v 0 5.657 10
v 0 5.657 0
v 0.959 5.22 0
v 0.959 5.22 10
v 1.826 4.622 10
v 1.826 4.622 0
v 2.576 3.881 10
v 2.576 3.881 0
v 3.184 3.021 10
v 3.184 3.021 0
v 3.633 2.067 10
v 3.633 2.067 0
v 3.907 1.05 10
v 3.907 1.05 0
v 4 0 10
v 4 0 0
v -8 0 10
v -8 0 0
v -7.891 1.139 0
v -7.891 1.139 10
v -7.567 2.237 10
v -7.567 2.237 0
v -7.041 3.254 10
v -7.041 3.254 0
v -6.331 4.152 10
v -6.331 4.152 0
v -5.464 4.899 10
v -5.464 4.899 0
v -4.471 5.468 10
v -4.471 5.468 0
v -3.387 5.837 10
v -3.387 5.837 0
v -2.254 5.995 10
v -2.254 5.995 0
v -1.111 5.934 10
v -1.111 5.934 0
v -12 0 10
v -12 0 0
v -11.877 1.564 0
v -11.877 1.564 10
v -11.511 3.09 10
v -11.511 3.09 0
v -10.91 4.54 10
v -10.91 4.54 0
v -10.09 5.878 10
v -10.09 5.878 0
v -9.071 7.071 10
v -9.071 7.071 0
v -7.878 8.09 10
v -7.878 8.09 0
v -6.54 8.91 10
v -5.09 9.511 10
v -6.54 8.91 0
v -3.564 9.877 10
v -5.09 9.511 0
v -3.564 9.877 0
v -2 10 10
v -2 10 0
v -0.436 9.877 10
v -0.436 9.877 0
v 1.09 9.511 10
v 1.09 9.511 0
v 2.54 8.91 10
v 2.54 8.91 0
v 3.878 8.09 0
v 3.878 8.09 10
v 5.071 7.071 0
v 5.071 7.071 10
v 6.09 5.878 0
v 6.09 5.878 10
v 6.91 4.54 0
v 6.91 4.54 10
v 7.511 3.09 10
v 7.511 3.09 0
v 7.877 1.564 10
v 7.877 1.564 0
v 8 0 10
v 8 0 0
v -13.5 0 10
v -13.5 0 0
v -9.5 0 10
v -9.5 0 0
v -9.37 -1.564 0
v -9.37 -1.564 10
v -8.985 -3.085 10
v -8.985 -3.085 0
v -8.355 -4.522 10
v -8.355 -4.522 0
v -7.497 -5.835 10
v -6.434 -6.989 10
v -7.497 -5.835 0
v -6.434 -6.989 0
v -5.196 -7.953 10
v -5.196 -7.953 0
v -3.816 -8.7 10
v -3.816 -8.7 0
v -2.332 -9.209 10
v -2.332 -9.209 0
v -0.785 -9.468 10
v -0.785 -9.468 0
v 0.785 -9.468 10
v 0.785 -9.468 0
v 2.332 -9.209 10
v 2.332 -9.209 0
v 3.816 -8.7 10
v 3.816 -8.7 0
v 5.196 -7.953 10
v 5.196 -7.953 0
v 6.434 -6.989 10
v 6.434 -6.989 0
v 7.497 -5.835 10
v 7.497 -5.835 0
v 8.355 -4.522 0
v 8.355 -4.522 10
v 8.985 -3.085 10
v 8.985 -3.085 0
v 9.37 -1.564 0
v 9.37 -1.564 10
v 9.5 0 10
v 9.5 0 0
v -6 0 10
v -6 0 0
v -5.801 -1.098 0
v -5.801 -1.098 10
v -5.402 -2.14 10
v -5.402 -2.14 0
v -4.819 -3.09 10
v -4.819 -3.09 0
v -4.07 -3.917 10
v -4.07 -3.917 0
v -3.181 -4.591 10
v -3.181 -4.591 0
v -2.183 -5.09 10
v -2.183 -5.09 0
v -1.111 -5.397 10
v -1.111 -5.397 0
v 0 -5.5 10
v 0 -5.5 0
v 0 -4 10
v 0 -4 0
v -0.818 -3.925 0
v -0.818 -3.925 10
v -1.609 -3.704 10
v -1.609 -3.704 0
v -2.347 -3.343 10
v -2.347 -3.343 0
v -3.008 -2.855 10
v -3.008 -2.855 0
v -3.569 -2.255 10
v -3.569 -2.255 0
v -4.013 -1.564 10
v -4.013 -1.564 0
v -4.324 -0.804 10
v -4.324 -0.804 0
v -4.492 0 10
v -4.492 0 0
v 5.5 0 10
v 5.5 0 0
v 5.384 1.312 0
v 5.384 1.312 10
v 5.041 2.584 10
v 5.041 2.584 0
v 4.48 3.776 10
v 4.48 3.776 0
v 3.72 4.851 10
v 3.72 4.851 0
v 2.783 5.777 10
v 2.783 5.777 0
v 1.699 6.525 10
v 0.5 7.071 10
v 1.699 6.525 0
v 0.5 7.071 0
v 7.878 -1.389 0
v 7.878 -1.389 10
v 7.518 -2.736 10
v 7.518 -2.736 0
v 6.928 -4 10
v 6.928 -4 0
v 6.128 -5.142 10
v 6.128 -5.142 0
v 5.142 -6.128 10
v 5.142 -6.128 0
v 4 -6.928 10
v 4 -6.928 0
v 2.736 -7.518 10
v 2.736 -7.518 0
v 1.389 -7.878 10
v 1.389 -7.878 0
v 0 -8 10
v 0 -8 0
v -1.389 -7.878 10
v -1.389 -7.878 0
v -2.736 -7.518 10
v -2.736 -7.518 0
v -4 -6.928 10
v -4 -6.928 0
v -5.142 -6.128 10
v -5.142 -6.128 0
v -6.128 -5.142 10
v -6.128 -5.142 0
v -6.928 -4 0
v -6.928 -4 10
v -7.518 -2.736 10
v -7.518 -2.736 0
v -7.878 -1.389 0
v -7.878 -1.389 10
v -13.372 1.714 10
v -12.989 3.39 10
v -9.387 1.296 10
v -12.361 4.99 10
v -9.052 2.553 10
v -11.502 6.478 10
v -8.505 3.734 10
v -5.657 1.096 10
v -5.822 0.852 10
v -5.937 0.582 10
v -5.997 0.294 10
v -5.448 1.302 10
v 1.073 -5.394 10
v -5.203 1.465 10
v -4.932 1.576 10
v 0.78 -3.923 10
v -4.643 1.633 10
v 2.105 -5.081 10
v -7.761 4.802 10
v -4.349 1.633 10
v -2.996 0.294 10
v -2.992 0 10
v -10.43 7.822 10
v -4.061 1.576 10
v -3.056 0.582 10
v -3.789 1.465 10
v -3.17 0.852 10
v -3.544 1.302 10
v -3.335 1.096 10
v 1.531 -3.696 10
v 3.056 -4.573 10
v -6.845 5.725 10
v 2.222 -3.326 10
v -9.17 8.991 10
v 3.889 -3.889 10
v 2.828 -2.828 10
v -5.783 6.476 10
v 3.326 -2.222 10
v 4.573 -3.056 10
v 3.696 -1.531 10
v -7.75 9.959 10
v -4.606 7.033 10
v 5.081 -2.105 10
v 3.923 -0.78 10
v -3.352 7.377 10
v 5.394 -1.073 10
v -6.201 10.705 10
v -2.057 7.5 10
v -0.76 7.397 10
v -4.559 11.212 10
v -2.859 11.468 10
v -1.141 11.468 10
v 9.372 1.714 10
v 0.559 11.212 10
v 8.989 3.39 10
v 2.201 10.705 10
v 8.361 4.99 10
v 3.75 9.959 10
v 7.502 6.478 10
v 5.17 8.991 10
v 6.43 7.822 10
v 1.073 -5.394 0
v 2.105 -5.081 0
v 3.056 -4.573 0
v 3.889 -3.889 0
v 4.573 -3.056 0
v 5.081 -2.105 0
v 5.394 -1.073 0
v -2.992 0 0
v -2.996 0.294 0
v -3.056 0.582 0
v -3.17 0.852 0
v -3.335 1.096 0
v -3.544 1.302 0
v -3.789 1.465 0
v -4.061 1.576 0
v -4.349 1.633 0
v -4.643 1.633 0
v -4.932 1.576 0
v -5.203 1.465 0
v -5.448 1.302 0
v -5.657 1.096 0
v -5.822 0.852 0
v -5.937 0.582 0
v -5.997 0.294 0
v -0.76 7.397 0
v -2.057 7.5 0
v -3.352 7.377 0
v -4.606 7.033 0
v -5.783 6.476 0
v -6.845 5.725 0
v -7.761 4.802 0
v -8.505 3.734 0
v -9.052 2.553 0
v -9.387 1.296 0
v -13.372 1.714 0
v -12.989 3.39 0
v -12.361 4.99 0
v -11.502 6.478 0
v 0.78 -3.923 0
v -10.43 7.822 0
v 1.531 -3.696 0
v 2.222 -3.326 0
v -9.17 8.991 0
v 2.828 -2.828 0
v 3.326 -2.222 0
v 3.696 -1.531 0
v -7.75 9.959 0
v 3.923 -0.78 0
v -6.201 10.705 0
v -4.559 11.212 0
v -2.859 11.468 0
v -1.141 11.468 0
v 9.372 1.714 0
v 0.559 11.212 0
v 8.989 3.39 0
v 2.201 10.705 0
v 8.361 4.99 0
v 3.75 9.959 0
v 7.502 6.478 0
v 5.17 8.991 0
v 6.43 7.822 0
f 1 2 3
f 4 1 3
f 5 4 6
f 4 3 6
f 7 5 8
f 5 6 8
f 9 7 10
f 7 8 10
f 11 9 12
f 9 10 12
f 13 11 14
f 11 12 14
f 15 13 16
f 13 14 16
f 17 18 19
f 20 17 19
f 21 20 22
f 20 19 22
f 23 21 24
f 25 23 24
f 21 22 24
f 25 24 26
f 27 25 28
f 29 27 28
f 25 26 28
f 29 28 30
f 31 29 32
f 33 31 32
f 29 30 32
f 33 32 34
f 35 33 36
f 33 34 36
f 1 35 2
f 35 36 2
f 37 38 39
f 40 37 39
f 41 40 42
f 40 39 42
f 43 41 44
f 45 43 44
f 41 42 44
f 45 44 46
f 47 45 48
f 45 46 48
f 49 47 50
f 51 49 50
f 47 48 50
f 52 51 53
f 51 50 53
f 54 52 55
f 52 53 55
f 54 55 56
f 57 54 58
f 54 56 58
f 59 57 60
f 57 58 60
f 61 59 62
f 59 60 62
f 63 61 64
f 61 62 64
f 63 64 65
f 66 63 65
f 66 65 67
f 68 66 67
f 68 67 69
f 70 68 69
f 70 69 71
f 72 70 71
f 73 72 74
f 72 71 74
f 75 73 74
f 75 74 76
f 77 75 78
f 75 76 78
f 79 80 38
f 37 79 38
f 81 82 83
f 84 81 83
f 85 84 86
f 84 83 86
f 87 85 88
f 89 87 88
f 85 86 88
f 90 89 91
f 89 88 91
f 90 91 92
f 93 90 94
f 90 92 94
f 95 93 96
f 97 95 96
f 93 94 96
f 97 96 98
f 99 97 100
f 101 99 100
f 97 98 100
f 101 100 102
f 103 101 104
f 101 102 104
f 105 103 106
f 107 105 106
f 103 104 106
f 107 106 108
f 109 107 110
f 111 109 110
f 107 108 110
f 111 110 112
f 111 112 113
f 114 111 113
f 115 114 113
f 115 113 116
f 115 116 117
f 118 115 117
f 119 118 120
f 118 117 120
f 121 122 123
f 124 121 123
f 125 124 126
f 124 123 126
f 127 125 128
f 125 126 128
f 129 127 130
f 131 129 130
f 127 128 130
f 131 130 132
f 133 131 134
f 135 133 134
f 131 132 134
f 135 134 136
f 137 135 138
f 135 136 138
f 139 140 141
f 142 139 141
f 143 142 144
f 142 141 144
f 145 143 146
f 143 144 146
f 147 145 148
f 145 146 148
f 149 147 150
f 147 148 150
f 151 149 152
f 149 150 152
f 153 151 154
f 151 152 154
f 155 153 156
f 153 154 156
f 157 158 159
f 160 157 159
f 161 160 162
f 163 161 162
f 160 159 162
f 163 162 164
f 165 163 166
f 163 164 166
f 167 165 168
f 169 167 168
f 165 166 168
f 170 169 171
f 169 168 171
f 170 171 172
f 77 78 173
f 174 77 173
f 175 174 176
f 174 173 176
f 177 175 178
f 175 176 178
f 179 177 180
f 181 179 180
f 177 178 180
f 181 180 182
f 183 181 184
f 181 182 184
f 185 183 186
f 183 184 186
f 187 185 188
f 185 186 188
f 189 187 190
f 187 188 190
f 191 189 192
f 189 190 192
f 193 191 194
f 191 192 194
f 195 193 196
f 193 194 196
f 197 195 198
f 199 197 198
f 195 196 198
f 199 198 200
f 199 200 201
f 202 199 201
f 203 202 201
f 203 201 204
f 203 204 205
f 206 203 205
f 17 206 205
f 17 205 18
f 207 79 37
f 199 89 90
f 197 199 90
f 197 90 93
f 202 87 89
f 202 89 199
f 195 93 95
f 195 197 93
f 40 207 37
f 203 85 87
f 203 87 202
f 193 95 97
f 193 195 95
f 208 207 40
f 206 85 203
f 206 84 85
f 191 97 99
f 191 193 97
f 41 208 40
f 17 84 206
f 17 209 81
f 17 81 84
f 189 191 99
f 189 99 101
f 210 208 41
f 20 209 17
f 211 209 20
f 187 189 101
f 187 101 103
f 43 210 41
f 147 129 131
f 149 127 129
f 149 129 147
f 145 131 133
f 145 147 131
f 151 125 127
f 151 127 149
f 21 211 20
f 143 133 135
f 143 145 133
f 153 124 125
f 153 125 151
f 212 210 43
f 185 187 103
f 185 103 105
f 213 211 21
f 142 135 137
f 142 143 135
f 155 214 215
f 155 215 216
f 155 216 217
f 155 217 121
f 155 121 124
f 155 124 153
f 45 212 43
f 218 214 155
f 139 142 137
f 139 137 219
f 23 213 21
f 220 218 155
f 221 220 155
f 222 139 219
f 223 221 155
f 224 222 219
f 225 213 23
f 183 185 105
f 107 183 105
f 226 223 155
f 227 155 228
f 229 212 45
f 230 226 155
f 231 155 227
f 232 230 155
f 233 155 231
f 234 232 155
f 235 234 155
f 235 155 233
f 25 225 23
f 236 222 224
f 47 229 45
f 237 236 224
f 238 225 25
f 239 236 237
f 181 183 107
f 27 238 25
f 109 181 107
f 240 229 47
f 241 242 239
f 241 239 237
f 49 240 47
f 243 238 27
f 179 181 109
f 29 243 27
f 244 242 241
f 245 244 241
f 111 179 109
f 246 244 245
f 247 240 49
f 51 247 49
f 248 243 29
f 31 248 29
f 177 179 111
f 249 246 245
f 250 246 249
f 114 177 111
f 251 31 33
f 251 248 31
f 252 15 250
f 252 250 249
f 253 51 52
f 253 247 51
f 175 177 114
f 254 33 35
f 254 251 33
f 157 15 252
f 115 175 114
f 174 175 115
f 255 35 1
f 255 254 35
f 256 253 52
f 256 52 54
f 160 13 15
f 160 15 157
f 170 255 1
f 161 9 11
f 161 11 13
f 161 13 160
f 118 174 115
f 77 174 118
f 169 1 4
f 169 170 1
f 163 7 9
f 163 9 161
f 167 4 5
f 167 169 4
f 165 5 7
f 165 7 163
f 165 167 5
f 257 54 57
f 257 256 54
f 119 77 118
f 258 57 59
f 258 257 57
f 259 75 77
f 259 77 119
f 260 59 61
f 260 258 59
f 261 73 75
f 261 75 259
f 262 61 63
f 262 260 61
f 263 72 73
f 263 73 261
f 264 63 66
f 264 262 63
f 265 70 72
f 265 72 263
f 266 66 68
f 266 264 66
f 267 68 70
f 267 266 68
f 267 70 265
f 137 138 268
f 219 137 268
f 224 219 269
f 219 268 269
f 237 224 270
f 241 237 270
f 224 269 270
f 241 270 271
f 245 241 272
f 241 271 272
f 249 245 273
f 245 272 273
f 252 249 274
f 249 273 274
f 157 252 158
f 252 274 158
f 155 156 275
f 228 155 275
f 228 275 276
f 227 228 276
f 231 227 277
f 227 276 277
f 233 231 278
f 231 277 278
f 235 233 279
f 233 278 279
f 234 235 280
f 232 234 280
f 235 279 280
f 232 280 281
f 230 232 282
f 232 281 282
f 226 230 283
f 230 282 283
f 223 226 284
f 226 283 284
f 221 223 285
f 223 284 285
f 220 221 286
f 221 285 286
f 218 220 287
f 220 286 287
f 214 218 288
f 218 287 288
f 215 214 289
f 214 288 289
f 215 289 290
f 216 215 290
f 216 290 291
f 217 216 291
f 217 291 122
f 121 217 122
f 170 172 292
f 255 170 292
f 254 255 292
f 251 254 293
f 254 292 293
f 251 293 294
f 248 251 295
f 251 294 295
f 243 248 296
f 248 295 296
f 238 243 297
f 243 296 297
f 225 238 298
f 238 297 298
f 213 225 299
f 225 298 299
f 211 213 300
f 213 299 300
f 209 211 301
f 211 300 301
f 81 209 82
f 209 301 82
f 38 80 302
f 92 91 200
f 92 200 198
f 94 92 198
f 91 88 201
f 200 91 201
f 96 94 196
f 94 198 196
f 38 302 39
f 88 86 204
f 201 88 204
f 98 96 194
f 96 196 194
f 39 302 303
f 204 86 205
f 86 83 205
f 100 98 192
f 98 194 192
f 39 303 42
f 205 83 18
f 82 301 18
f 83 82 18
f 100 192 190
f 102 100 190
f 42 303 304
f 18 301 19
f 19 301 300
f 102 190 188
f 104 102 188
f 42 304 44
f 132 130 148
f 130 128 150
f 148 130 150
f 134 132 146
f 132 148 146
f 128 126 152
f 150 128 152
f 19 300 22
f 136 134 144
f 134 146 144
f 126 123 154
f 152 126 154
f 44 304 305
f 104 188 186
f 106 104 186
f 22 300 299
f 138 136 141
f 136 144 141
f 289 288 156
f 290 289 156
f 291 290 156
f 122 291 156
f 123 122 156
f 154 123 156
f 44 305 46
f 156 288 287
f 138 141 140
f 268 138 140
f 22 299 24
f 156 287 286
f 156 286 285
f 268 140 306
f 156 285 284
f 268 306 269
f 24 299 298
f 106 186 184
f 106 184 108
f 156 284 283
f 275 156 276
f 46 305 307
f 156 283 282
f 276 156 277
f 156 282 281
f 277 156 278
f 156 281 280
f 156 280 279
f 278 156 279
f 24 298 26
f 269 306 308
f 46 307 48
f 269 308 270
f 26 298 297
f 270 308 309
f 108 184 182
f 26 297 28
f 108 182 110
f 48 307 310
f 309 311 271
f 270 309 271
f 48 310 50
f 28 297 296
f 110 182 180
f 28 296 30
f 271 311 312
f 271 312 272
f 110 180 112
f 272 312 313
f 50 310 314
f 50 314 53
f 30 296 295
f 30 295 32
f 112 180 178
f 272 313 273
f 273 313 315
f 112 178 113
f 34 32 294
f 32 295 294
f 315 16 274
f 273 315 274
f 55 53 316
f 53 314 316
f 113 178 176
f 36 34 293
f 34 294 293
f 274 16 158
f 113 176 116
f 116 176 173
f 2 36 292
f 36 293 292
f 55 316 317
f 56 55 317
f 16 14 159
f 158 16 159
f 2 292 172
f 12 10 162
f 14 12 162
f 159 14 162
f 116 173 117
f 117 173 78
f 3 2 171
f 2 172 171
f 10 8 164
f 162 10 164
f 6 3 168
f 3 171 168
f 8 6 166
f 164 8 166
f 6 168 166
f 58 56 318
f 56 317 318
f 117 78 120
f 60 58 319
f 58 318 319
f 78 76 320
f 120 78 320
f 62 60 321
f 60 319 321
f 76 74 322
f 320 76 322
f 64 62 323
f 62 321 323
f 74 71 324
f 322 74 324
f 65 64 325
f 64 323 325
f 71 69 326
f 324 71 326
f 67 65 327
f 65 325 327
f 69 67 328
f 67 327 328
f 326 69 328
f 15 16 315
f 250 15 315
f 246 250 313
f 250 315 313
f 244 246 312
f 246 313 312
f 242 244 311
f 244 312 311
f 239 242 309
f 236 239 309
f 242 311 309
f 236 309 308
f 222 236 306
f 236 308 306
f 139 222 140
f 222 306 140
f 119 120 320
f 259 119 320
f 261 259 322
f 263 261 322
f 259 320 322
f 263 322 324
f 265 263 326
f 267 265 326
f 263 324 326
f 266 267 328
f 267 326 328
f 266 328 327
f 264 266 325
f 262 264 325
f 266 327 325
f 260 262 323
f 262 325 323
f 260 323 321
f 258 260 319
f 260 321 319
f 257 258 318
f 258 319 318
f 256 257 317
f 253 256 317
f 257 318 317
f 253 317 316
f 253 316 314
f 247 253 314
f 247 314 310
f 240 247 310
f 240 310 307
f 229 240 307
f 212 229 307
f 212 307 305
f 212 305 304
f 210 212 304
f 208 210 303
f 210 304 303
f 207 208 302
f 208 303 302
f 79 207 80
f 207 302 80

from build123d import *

# Parameters (mm, degrees)
F1_DEPTH = 10


with BuildPart() as f1:
    # F0 (on Top) → F1 (new body)
    with BuildSketch(Plane.XY):
        with BuildLine():
            ThreePointArc((0, 5.656854), (2.898979, 3.464102), (4, 0))
            ThreePointArc((4, 0), (2.828427, -2.828427), (0, -4))
            ThreePointArc((0, -4), (-3.007566, -2.855084), (-4.492418, 0))
            Line((-4.492418, 0), (-2.992418, 0))
            ThreePointArc((-2.992418, 0), (-4.496209, 1.640499), (-6, 0))
            ThreePointArc((-6, 0), (-4.069705, -3.916951), (0, -5.5))
            ThreePointArc((0, -5.5), (3.889087, -3.889087), (5.5, 0))
            ThreePointArc((5.5, 0), (4.123724, 4.330127), (0.5, 7.071068))
            ThreePointArc((0.5, 7.071068), (-6.330127, 6.123724), (-9.5, 0))
            ThreePointArc((-9.5, 0), (0, -9.5), (9.5, 0))
            ThreePointArc((9.5, 0), (-2, 11.5), (-13.5, 0))
            Line((-13.5, 0), (-12, 0))
            ThreePointArc((-12, 0), (-2, 10), (8, 0))
            ThreePointArc((8, 0), (0, -8), (-8, 0))
            ThreePointArc((-8, 0), (-5.464102, 4.898979), (0, 5.656854))
        make_face()
    extrude(amount=F1_DEPTH)


solid = f1.part
